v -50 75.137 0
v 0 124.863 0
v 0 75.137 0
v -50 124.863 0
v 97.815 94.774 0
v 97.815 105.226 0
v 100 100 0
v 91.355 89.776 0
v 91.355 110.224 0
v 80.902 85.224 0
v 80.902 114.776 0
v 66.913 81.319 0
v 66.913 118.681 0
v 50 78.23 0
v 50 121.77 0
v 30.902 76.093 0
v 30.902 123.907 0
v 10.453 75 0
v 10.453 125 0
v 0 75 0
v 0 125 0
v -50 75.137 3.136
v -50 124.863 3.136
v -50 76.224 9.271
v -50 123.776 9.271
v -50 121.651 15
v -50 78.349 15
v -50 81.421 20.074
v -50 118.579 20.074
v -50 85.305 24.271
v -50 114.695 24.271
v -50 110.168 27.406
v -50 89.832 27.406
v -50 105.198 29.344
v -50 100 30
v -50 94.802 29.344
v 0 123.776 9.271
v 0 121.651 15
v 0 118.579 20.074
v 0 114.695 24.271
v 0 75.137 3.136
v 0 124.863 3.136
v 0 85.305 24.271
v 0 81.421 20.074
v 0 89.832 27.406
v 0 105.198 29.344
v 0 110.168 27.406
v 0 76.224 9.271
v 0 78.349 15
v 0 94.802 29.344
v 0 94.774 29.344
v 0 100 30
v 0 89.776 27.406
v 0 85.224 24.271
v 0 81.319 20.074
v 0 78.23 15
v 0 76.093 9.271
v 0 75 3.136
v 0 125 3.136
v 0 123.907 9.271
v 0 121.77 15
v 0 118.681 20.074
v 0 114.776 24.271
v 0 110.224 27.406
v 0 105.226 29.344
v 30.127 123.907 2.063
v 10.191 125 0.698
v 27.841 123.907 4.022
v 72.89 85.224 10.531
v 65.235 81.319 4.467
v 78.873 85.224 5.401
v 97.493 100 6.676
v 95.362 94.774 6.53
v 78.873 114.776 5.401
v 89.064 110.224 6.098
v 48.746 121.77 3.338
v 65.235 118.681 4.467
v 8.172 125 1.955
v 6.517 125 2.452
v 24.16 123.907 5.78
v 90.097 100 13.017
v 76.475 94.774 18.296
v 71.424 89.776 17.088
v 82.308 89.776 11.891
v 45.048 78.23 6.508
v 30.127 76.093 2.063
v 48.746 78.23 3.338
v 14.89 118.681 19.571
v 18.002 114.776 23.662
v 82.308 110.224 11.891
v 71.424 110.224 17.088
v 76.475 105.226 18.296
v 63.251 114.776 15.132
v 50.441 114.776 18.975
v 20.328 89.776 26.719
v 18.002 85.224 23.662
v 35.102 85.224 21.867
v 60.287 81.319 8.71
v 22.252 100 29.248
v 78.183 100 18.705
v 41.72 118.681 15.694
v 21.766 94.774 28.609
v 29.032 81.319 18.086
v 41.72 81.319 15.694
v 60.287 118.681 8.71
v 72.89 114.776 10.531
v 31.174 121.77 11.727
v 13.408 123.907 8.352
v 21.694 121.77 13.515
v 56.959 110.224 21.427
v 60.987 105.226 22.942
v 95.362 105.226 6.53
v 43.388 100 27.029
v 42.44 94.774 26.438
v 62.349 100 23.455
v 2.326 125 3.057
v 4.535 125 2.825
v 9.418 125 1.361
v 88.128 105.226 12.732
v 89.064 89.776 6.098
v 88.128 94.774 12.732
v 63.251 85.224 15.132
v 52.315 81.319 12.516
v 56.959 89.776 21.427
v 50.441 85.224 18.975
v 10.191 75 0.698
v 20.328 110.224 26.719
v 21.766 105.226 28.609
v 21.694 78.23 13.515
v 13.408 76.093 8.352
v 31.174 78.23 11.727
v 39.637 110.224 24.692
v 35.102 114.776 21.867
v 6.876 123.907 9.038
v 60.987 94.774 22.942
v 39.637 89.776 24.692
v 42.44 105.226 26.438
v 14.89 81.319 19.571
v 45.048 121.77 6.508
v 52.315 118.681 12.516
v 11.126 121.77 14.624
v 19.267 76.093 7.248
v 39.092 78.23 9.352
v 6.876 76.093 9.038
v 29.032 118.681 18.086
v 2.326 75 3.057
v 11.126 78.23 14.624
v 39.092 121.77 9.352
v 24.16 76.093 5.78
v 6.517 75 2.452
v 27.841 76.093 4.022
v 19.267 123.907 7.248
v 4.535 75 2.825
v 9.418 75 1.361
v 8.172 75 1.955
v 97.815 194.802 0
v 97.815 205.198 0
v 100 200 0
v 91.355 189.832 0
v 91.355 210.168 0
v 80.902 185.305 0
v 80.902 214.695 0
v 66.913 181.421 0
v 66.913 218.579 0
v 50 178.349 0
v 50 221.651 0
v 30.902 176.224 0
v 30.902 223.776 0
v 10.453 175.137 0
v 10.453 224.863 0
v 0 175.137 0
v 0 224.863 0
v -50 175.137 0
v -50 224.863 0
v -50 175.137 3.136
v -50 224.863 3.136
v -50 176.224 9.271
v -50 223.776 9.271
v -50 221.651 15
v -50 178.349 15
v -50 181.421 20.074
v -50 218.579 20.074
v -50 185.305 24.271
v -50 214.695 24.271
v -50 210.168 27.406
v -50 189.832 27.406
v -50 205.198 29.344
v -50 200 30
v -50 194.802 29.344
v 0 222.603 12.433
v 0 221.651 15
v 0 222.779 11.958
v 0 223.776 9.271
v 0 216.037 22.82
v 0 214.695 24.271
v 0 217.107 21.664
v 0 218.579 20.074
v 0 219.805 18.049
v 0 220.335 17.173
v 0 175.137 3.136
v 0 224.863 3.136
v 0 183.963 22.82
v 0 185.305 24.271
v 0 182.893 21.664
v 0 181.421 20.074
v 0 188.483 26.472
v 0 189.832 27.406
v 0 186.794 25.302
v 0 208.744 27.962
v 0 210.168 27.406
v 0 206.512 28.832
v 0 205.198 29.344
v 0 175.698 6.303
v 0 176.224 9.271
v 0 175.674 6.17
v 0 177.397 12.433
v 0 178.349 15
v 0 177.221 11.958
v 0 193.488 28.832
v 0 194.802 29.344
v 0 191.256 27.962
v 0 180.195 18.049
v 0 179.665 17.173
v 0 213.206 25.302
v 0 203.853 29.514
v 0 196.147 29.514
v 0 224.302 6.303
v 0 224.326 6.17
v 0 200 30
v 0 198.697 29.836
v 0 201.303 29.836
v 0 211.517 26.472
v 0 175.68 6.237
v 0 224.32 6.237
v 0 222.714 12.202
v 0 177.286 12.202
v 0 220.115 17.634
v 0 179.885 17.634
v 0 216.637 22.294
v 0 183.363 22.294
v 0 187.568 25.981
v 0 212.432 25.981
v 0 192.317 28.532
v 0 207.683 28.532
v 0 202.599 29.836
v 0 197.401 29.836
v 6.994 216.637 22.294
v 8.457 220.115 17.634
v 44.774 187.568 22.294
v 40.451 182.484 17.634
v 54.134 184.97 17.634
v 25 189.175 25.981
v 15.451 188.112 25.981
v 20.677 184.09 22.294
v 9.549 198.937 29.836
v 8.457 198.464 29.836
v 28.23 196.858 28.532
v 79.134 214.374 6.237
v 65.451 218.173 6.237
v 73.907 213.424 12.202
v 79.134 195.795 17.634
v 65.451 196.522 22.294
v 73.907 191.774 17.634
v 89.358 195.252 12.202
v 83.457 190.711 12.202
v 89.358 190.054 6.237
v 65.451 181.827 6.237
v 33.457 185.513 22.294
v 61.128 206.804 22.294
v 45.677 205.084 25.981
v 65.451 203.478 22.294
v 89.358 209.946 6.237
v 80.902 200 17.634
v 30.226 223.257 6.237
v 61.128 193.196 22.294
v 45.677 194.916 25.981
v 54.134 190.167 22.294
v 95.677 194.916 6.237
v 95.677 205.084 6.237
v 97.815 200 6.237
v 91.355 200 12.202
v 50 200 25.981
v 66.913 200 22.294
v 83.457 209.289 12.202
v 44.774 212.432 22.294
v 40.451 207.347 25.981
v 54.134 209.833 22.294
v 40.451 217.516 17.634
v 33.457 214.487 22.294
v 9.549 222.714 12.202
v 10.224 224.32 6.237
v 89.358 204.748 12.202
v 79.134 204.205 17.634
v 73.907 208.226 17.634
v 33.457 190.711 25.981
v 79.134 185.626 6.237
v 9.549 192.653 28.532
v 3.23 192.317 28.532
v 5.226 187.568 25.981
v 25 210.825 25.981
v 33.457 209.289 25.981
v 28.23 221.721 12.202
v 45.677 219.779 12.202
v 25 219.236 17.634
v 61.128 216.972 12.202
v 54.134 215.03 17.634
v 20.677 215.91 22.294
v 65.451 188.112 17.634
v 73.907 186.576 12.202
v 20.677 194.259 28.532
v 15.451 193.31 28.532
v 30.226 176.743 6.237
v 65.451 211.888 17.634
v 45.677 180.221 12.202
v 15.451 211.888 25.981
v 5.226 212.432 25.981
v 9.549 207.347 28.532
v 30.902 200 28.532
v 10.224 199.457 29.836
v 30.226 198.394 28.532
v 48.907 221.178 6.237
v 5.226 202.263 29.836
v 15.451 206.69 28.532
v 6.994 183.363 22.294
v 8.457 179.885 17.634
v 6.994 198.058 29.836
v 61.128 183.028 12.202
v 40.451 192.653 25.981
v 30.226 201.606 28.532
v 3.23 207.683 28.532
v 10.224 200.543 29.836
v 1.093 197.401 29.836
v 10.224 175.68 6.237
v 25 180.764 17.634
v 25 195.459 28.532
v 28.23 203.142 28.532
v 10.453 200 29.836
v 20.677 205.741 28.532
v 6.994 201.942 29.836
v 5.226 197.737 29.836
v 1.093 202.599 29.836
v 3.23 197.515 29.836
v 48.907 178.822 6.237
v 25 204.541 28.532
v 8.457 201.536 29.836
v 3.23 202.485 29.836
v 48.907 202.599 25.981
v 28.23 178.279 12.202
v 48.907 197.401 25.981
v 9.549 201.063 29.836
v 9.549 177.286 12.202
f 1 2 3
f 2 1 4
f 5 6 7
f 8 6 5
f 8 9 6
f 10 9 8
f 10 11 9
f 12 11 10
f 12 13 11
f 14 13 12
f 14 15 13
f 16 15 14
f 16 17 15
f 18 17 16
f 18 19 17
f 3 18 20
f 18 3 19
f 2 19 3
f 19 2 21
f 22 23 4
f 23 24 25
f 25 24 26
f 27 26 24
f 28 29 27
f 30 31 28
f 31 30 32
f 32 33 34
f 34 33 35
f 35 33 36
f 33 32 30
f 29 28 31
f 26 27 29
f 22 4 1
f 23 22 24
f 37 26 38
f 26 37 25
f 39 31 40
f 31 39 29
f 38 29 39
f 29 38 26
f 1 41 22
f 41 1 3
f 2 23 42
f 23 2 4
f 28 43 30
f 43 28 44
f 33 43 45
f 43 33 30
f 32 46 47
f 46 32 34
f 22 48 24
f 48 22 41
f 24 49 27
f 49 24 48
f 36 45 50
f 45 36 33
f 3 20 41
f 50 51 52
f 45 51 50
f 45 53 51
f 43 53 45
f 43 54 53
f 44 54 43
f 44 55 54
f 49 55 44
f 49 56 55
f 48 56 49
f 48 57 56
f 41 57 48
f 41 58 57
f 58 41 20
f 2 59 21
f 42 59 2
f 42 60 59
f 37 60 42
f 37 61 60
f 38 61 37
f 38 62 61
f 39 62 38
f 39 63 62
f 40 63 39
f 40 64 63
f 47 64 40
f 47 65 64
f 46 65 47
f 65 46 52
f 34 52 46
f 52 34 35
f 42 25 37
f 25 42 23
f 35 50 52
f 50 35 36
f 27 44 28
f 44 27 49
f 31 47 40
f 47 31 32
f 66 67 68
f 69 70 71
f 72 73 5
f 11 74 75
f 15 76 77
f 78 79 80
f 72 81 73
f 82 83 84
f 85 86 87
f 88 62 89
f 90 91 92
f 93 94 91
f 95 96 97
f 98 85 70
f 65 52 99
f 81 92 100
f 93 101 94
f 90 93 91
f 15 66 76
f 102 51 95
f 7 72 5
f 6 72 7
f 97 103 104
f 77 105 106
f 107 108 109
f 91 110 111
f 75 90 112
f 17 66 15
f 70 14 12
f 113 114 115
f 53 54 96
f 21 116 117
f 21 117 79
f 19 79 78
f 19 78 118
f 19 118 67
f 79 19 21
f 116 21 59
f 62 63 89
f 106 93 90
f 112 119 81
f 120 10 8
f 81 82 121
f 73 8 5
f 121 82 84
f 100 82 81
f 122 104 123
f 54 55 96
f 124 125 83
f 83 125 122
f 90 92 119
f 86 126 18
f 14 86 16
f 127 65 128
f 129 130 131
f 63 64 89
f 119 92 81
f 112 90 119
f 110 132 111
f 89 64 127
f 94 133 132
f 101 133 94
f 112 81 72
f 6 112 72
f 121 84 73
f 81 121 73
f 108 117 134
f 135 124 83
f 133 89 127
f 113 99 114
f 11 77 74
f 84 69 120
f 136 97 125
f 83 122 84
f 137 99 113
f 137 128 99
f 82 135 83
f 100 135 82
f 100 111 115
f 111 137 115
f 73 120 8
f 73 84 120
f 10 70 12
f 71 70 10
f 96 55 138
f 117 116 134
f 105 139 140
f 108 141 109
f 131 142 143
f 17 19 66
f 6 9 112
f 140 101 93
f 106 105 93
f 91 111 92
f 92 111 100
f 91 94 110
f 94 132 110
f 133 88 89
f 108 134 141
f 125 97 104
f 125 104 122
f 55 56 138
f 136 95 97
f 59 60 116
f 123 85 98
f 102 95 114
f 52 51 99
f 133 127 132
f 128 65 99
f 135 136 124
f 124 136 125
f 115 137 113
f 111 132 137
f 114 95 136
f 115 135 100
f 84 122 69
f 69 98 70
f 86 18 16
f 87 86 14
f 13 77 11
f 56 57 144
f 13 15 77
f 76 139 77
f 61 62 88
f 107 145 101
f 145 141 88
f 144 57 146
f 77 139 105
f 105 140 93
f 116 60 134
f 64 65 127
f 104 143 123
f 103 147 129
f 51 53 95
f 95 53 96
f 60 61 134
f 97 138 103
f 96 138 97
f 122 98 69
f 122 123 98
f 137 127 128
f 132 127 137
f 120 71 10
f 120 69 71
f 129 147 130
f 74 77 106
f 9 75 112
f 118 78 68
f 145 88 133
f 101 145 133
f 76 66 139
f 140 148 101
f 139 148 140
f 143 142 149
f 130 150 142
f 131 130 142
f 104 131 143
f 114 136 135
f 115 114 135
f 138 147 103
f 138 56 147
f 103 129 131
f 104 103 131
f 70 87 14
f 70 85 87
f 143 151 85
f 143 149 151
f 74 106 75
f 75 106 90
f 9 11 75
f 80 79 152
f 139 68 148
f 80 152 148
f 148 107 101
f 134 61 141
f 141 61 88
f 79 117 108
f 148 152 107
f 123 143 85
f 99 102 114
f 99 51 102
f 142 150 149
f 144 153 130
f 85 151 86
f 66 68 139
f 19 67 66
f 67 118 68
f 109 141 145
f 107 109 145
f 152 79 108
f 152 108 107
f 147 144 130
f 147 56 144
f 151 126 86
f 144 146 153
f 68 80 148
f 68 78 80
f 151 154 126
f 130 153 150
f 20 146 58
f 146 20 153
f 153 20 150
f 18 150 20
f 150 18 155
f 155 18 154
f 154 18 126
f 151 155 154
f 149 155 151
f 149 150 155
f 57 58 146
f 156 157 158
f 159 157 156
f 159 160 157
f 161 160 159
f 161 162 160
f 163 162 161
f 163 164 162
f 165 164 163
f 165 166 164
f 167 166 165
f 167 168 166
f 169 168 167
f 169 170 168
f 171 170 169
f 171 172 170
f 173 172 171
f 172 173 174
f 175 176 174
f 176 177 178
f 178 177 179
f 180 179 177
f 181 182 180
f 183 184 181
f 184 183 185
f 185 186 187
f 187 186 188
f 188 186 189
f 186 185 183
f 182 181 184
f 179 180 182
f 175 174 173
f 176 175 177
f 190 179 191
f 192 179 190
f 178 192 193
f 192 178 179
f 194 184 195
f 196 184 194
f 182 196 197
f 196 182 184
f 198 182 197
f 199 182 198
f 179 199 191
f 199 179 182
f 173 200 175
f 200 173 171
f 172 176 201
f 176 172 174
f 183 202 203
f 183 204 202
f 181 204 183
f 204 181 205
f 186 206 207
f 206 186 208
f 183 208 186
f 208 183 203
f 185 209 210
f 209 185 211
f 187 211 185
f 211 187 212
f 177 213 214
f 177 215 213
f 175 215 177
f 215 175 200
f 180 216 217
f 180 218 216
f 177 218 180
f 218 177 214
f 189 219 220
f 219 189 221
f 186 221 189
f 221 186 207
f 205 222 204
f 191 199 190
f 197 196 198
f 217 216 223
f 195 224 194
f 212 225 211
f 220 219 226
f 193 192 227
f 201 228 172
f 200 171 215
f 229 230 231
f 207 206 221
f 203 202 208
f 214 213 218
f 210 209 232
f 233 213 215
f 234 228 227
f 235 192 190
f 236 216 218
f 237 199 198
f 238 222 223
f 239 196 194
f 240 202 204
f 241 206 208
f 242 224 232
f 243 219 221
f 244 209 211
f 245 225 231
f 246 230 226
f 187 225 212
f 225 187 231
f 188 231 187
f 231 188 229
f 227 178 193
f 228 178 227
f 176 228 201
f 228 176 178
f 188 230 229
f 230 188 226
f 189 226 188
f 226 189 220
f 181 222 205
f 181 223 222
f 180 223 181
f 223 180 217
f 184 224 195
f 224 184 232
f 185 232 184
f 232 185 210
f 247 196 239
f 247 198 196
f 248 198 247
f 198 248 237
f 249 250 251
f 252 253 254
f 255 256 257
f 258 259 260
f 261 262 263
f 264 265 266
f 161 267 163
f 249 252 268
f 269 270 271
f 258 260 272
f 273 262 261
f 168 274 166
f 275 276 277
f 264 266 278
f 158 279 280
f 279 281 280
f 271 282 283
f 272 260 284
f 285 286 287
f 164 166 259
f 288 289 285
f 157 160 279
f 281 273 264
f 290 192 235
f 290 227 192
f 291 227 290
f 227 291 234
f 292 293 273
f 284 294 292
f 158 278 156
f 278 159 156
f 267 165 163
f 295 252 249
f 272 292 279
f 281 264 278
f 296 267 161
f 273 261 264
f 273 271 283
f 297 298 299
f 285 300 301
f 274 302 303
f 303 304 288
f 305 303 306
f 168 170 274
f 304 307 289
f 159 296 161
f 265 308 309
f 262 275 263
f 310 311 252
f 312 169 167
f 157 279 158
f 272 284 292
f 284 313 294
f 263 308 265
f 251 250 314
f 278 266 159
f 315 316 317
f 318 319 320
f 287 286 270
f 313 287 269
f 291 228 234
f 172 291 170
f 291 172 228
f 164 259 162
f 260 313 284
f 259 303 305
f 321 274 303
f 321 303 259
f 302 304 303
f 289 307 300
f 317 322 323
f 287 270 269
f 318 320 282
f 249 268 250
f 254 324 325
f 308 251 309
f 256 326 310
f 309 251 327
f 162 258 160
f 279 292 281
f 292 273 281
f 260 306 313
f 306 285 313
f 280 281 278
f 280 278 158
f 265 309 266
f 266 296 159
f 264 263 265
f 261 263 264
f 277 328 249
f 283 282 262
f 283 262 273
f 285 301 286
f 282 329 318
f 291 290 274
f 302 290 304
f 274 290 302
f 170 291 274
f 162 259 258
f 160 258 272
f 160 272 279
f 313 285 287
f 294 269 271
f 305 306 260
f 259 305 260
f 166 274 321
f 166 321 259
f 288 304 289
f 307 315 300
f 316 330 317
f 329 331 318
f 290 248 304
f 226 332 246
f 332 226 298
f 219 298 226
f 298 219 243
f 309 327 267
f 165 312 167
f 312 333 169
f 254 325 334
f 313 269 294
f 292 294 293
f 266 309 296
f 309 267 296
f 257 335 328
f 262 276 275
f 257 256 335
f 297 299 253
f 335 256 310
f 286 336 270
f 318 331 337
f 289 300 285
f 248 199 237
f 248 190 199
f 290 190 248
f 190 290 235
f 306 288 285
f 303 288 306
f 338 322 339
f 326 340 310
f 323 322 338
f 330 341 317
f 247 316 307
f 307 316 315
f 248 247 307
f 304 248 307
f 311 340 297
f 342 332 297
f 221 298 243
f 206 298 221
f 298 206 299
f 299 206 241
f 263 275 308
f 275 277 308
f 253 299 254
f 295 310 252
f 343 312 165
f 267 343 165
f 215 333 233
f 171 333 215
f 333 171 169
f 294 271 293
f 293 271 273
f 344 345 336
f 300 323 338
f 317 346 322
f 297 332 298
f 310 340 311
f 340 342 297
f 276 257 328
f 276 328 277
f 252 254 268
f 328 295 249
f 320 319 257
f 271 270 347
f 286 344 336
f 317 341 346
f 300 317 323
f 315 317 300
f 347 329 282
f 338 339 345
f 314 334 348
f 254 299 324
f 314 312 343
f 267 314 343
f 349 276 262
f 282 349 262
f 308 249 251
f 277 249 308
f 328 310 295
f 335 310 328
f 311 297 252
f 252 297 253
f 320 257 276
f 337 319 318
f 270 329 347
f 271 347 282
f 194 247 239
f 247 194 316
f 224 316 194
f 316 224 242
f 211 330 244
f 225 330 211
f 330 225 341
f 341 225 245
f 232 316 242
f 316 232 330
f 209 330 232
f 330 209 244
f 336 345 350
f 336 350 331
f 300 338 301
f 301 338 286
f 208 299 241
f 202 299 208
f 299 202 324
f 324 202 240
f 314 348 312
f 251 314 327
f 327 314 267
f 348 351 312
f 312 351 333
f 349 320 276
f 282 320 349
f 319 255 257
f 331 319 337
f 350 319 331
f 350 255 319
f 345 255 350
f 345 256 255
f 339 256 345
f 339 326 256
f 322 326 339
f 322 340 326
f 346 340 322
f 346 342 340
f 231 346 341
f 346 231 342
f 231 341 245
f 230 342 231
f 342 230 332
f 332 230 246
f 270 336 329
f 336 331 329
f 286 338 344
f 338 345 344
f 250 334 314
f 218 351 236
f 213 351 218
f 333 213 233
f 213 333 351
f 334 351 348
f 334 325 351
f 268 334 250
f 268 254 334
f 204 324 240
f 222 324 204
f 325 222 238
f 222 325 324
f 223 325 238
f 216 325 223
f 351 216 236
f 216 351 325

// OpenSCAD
module engine1(x,y,z) {
    translate([x,y,z]) {
        scale([2,1,.6])
        rotate([90,0,0])
        rotate_extrude(angle=90)
        intersection() {
            translate([0,-25,0])
            square(size=[50,50]);
            resize([100,50,0])
            circle(r=100);
        }
        scale([1,0.25,0.3])
        translate([-50,0,0])
        intersection() {
            translate([0,-100,0]) cube([200,200,200]);
            rotate([0,90,0])
            cylinder(r1=100,r2=100,h=50);
        }
    }
}

module engine2(x,y,z) {
    translate([x,y,z]) {
        scale([1,0.25,0.3])
        intersection() {
            translate([0,-100,0])
            cube([200,200,200]);
            sphere(r=100);
        }

        scale([1,0.25,0.3])
        translate([-50,0,0])
        intersection() {
            translate([0,-100,0])
            cube([200,200,200]);
            rotate([0,90,0])
            cylinder(r1=100,r2=100,h=50);
        }
    }
}

engine1(0,100,0);
engine2(0,200,0);
